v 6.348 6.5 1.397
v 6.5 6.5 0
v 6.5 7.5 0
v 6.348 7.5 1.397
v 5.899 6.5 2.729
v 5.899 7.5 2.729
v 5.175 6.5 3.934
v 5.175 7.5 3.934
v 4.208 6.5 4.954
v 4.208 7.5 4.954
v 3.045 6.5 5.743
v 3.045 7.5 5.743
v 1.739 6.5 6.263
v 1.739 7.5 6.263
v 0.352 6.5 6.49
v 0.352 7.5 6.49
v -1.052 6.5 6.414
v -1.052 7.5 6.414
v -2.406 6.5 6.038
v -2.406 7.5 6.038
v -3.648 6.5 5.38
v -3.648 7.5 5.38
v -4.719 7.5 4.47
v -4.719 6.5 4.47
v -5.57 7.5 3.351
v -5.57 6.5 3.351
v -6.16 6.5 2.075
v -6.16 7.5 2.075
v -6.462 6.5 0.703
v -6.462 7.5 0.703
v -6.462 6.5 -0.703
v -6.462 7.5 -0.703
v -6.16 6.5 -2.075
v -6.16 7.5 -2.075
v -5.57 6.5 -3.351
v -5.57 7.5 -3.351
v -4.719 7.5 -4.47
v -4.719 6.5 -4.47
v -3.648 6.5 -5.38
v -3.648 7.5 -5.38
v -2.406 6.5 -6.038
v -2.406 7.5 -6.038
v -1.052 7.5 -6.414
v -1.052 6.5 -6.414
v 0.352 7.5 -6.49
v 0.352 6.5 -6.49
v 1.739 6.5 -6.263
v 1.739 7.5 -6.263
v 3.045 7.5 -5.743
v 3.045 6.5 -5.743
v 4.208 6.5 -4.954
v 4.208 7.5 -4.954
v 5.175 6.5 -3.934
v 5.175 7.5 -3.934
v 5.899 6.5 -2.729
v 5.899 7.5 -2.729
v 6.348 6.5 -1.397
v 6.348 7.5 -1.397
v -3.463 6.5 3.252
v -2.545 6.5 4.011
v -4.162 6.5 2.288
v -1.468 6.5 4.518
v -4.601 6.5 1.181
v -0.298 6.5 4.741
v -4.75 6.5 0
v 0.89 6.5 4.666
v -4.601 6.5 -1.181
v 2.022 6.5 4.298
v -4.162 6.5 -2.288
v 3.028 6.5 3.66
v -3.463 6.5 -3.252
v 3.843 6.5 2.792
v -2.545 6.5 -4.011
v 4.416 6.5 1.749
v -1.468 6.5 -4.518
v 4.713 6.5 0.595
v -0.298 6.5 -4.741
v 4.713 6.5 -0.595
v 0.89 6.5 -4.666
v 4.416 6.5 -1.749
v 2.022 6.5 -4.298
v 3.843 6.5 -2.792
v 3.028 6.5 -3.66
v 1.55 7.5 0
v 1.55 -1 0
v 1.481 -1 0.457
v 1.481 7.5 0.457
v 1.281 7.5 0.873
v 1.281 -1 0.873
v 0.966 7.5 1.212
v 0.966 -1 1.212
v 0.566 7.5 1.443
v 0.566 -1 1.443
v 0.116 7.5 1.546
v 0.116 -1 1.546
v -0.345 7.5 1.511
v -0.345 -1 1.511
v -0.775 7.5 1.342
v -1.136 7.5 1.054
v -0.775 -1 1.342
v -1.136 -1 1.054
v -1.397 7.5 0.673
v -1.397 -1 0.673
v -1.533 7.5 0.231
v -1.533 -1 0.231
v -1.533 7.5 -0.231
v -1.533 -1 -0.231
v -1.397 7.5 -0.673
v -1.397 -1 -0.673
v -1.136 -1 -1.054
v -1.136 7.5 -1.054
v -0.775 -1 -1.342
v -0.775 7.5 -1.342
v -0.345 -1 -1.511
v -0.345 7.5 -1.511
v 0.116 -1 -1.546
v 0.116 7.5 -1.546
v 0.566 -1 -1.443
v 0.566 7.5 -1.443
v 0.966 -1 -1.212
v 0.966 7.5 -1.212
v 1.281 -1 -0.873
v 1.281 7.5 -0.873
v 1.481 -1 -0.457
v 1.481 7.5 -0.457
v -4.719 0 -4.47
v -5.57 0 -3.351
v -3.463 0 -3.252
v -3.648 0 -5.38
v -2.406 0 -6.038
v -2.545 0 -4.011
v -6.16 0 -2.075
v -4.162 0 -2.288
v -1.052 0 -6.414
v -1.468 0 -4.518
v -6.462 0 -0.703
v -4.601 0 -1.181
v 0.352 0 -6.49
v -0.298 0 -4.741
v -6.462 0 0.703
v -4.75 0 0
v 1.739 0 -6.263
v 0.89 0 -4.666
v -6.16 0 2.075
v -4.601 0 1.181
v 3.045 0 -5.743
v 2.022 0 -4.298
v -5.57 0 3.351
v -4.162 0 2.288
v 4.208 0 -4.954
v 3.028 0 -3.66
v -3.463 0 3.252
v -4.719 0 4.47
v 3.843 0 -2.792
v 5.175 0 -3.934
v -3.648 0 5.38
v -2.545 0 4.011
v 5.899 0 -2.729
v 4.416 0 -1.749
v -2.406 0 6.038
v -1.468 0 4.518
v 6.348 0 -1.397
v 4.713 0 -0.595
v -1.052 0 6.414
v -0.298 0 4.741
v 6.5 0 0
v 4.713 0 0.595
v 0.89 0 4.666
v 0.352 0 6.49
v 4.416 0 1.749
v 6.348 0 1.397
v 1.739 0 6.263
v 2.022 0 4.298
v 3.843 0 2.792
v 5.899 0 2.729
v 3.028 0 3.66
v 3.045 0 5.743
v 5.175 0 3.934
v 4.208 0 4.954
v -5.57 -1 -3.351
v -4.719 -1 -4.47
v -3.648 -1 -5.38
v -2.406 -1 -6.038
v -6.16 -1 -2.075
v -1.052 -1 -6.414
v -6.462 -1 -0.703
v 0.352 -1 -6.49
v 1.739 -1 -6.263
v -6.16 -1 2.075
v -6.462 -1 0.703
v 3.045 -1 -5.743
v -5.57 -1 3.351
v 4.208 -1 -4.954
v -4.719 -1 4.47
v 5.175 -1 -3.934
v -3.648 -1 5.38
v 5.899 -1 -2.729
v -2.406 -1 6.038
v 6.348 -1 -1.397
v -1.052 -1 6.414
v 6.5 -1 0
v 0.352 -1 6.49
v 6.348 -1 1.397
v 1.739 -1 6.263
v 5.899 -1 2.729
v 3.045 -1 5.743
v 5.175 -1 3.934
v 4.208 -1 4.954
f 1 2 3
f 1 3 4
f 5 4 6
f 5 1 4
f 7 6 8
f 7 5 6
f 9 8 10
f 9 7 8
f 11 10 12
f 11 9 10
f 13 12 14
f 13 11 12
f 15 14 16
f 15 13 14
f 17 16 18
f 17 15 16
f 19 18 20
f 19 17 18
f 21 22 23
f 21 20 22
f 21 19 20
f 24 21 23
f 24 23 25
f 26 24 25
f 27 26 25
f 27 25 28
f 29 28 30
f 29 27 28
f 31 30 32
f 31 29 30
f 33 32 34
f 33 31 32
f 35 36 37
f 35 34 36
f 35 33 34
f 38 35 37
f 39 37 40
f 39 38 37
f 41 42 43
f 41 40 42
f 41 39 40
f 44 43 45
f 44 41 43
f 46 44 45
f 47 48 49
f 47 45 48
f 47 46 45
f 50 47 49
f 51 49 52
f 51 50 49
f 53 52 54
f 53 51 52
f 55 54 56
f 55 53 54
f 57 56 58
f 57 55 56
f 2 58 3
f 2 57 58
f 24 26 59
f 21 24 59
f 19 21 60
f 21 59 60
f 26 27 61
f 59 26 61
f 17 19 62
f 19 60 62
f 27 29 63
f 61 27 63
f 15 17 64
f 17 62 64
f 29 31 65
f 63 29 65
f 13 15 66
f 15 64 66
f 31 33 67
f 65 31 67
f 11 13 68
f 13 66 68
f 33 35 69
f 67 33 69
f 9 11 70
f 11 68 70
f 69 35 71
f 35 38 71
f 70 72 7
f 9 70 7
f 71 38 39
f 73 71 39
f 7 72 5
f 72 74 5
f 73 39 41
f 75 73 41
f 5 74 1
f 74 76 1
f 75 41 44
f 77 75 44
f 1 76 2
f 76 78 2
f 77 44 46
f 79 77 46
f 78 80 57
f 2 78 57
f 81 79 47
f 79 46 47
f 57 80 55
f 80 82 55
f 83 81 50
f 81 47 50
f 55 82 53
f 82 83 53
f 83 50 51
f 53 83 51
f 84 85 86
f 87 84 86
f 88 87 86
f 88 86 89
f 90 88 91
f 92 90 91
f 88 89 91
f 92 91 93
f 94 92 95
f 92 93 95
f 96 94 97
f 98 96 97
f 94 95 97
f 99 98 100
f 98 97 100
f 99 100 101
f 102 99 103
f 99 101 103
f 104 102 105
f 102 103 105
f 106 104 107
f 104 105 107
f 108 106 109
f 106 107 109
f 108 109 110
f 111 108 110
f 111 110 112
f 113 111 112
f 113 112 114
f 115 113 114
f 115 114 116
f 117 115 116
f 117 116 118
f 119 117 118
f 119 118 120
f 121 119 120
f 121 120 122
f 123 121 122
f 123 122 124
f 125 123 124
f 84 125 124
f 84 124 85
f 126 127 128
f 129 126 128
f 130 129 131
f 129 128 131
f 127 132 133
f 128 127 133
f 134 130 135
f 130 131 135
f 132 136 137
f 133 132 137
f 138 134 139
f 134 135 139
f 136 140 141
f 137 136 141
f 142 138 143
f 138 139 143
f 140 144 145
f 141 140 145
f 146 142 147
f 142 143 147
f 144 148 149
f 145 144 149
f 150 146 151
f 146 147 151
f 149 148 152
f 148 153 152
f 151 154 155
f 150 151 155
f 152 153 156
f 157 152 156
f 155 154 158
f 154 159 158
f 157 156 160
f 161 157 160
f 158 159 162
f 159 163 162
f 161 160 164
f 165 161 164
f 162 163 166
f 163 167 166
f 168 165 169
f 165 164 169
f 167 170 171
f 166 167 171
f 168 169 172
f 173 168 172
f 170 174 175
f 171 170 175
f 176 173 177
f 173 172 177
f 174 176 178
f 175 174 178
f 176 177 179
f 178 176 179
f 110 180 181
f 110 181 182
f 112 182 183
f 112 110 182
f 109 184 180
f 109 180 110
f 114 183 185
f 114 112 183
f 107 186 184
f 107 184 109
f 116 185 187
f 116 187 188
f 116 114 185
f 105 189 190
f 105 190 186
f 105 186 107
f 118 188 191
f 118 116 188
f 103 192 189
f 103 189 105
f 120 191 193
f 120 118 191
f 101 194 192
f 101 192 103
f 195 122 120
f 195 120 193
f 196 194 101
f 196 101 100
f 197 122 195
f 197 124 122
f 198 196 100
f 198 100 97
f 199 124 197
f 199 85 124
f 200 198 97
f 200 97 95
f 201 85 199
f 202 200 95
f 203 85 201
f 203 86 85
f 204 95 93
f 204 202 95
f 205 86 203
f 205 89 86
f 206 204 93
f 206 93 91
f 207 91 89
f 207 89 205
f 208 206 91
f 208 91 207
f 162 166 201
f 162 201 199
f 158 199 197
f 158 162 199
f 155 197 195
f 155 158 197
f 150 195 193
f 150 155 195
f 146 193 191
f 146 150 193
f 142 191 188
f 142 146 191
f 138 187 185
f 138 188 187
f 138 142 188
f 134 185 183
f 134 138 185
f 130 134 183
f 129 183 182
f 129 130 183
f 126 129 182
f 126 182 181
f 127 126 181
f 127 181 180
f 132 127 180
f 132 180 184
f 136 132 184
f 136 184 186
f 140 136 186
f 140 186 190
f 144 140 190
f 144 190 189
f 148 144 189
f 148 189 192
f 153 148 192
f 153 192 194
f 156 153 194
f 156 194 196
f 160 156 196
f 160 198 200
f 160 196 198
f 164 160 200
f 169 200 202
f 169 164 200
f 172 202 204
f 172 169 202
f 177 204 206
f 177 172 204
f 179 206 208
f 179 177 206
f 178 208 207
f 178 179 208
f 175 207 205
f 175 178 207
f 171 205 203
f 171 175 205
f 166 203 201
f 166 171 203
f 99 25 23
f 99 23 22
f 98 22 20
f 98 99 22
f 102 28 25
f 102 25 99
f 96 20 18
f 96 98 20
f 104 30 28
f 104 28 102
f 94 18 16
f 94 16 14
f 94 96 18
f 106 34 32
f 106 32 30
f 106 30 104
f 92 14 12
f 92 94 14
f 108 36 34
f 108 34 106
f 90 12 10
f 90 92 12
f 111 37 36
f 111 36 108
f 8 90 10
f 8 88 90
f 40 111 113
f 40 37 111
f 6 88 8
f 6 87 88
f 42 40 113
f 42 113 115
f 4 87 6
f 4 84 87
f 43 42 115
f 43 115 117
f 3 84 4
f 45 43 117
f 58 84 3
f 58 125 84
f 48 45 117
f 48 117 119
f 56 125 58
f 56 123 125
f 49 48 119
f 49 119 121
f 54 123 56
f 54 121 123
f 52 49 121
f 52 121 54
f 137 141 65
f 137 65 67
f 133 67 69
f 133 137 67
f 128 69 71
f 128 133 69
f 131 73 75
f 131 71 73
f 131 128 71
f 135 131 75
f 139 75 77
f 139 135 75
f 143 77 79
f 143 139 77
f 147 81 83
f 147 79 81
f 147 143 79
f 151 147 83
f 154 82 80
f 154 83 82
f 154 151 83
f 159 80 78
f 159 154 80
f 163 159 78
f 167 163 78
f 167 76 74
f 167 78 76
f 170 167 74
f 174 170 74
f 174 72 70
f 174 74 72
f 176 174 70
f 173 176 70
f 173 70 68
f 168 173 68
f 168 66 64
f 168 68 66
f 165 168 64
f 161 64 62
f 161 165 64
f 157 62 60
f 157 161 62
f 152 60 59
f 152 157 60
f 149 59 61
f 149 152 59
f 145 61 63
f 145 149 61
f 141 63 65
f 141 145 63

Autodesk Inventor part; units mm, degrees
ref_plane "YZ Plane" through (0, 0, 0) normal (1, 0, 0) x (0, 1, 0)
ref_plane "XZ Plane" through (0, 0, 0) normal (0, 1, 0) x (-1, 0, 0)
ref_plane "XY Plane" through (0, 0, 0) normal (0, 0, 1) x (1, 0, 0)
sketch "Boceto1" plane through (0, 0, 0) normal (0, 1, 0) x (-1, 0, 0)
  circle A0 centre (0, 0) radius 4.75
  dimension "d0" = 9.5
extrude "Extrusión1" add sketch "Boceto1" along normal blind 6.5
sketch "Boceto2" plane through (0, 6.5, 0) normal (0, 1, 0) x (1, 0, 0)
  circle A0 centre (0, 0) radius 4.75 projected
  circle A1 centre (0, 0) radius 6.5
  dimension "d3" = 13
extrude "Extrusión2" add sketch "Boceto2" along normal blind 1 contours A0 | A1
sketch "Boceto3" plane through (0, 0, 0) normal (0, -1, 0) x (1, 0, 0)
  circle A0 centre (0, 0) radius 6.5
extrude "Extrusión3" add sketch "Boceto3" along normal blind 1
sketch "Boceto4" plane through (0, -1, 0) normal (0, -1, 0) x (1, 0, 0)
  circle A0 centre (0, 0) radius 1.55
  dimension "d8" = 3.1
extrude "Extrusión4" cut sketch "Boceto4" against normal through all
properties part number "Polea Lisa" material "Acero inoxidable"
